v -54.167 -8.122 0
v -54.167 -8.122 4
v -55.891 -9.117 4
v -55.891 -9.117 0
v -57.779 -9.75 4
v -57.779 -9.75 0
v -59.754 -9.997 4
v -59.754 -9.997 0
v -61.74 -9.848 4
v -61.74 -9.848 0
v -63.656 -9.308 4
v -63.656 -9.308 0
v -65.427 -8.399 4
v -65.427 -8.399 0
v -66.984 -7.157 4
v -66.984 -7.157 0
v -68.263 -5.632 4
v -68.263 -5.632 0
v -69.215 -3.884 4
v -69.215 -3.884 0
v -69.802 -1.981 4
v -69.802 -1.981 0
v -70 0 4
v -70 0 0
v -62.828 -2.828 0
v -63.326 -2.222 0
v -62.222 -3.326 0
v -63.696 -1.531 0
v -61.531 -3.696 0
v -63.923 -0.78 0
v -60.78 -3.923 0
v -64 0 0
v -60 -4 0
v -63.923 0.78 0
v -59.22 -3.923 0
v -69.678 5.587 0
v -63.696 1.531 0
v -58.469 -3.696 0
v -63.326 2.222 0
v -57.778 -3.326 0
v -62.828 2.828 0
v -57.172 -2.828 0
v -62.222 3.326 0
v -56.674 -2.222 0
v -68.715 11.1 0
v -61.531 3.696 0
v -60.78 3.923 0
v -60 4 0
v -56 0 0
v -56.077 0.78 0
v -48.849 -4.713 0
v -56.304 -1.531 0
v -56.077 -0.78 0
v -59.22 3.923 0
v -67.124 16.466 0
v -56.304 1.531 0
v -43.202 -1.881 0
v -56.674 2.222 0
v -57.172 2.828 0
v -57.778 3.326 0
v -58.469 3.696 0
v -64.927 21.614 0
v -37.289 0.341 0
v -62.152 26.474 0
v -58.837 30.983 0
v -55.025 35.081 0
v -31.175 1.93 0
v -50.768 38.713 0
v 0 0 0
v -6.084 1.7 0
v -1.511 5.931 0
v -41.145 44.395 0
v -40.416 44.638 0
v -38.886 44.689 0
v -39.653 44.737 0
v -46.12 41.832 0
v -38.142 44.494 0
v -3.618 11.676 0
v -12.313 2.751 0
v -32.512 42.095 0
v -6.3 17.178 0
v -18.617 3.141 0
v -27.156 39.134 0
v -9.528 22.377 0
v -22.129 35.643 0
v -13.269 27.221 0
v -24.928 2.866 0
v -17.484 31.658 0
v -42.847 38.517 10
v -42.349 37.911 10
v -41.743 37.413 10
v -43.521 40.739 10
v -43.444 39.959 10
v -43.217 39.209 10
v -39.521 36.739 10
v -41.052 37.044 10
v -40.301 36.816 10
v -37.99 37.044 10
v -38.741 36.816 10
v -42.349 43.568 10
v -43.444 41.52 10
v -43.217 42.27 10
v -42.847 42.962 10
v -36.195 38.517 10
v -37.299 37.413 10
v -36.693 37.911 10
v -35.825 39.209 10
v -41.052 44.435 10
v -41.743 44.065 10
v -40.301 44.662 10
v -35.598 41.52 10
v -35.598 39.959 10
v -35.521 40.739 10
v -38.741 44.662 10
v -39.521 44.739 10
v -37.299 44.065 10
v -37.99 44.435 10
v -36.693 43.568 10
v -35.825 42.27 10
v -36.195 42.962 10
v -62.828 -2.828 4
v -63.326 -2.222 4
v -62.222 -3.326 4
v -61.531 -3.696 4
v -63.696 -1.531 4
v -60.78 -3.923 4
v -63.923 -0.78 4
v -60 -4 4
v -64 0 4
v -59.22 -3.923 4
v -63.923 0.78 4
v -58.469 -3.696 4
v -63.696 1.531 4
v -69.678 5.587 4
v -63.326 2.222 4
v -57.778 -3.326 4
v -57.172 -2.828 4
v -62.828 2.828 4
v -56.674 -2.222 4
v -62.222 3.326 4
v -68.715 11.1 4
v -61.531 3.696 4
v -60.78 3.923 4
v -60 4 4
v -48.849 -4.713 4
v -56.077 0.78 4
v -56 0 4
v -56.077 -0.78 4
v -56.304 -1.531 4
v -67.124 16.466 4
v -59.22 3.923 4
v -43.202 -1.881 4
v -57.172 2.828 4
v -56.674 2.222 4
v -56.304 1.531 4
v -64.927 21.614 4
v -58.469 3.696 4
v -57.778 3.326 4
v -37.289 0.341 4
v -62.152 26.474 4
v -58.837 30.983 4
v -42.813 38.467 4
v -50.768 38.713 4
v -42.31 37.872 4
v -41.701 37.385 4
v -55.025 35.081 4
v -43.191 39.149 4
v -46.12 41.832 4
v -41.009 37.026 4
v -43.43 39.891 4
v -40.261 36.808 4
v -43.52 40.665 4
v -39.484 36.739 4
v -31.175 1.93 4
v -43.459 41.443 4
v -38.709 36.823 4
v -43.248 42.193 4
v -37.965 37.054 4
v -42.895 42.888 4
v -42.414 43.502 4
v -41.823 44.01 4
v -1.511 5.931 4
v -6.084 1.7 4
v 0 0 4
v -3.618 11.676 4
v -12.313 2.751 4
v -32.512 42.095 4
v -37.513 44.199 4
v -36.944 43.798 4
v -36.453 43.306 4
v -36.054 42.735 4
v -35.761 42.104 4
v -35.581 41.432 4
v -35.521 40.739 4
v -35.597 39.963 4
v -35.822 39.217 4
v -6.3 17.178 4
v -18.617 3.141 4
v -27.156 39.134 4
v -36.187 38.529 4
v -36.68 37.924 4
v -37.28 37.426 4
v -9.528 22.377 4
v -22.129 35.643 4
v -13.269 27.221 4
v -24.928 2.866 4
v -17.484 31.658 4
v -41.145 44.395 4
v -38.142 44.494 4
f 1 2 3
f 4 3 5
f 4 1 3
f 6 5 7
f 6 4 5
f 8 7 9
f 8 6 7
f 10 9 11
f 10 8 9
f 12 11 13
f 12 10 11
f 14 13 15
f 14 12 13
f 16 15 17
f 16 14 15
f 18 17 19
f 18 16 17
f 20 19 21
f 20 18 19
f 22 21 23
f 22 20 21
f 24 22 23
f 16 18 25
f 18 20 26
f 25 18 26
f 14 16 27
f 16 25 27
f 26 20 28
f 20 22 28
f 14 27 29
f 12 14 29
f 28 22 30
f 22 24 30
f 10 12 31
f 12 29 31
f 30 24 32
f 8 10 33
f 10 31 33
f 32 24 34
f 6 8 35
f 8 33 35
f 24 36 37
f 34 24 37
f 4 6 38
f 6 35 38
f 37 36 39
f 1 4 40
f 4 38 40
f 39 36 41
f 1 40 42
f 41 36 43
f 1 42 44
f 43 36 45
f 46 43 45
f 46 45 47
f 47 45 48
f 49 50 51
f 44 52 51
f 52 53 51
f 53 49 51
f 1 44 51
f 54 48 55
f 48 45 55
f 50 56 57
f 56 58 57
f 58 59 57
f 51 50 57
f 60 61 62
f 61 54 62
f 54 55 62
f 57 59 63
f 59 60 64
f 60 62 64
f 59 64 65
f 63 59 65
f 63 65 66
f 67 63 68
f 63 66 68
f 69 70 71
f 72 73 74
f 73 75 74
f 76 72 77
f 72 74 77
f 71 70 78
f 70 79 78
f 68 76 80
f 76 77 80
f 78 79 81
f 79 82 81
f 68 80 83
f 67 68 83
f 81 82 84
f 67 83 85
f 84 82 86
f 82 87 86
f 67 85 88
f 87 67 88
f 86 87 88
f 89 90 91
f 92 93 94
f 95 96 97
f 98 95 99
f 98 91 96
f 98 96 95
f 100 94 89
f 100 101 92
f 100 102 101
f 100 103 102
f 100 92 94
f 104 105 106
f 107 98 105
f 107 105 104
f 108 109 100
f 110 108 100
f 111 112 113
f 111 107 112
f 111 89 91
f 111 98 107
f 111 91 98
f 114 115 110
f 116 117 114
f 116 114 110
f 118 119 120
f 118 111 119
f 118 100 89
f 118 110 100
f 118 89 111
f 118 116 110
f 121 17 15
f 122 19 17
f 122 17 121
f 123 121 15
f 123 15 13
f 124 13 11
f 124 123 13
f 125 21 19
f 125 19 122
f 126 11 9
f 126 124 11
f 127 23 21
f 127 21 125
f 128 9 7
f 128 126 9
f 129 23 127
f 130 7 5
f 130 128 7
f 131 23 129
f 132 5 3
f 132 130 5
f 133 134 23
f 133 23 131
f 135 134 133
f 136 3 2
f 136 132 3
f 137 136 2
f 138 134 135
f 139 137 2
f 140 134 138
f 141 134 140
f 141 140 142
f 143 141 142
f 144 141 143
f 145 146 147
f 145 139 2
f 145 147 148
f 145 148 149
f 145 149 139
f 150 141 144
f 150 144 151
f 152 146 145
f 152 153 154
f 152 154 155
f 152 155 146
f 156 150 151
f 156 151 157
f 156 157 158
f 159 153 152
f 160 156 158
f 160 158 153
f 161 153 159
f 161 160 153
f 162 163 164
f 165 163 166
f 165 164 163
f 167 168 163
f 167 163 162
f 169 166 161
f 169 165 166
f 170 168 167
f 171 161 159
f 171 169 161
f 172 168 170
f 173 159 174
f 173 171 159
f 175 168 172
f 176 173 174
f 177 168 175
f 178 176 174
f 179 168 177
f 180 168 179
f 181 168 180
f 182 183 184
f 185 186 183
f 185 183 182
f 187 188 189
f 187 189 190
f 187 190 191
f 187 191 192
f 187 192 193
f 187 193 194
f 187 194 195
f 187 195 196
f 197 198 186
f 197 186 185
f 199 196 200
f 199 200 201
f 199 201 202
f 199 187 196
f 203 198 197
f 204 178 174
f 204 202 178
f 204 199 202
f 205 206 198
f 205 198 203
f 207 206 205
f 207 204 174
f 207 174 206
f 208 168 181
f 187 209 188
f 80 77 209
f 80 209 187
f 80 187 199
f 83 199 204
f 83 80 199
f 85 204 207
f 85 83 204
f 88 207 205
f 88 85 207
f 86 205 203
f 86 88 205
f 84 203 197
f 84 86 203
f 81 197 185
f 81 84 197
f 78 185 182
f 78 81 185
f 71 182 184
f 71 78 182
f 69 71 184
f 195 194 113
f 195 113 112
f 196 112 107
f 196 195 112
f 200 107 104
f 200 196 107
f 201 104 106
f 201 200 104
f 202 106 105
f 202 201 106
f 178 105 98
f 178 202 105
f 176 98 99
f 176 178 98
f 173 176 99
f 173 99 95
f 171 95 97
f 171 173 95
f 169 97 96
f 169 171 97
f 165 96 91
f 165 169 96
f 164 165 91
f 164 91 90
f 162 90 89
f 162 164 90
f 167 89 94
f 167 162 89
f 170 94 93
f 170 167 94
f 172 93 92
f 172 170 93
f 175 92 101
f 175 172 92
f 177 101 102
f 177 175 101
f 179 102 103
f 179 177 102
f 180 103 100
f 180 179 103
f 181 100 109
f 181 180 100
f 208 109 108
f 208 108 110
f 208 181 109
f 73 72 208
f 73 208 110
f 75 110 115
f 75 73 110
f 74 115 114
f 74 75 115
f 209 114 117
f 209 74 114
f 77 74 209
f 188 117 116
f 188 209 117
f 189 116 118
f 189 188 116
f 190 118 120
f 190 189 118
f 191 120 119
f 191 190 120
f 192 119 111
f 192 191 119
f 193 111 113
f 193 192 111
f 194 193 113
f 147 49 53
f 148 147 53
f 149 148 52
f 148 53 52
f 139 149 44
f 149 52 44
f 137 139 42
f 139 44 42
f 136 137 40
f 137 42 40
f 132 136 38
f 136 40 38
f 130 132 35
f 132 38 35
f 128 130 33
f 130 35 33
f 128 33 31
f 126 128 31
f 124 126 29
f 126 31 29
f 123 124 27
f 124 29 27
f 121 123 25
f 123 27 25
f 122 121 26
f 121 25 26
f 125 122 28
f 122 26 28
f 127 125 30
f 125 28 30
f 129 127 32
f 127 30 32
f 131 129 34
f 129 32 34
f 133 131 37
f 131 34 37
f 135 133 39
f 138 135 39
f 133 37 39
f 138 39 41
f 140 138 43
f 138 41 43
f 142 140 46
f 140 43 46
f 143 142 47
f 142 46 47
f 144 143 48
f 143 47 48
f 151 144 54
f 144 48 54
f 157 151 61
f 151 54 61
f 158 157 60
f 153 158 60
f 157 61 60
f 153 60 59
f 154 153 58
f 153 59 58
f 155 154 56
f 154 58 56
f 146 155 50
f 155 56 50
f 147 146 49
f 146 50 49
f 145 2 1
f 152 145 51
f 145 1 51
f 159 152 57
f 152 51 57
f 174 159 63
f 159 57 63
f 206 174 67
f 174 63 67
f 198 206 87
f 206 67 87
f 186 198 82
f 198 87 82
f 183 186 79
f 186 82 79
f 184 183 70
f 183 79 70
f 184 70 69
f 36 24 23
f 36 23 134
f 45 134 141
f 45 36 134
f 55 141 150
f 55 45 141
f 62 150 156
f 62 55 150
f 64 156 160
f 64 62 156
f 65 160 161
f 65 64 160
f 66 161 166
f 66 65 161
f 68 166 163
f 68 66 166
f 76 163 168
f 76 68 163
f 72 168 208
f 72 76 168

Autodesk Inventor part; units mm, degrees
ref_plane "YZ Plane" through (0, 0, 0) normal (1, 0, 0) x (0, 1, 0)
ref_plane "XZ Plane" through (0, 0, 0) normal (0, 1, 0) x (-1, 0, 0)
ref_plane "XY Plane" through (0, 0, 0) normal (0, 0, 1) x (1, 0, 0)
sketch "Sketch1" plane through (0, 0, 0) normal (0, 0, 1) x (1, 0, 0)
  circle A0 centre (0, 0) radius 50
  circle A1 centre (0, 0) radius 60
  circle A2 centre (0, 0) radius 70
  circle A3 centre (-60, 0) radius 10
  circle A4 centre (-60, 0) radius 4
  line L0 (0, 0) -> (-60, 0) construction
  line L1 (0, 0) -> (-30, -51.9615) construction
  circle A5 centre (-30, -51.9615) radius 10
  circle A6 centre (-30, -51.9615) radius 4
  line L2 (0, 0) -> (30, -51.9615) construction
  circle A7 centre (30, -51.9615) radius 10
  circle A8 centre (30, -51.9615) radius 4
  line L3 (0, 0) -> (60, 0) construction
  circle A9 centre (60, 0) radius 10
  circle A10 centre (60, 0) radius 4
  line L4 (0, 0) -> (30, 51.9615) construction
  circle A11 centre (30, 51.9615) radius 10
  circle A12 centre (30, 51.9615) radius 4
  line L5 (0, 0) -> (-30, 51.9615) construction
  circle A13 centre (-30, 51.9615) radius 10
  circle A14 centre (-30, 51.9615) radius 4
  arc A15 (0, 0) -> (-39.6557, 45.027) centre (-58.8223, -11.8293) ccw
  arc A16 (0, 0) -> (-58.8223, -11.8293) centre (-19.1667, -56.8563) ccw
  arc A17 (-39.6557, 45.027) -> (-70, 0) centre (-21.4208, 0) ccw
  line L6 (0, 0) -> (60, 0) construction
  circle A18 centre (-39.521, 40.7393) radius 4
  arc A19 (-39.521, 40.7393) -> (-85.0417, 38.105) centre (-60, 0) ccw construction
  line L7 (-60, 0) -> (-85.0417, 38.105) construction
  line L8 (-60, 0) -> (-39.521, 40.7393) construction
  line L9 (-85.0417, 38.105) -> (0, 0) construction
  point P0 (-54.1667, -8.1223)
  point P1 (-38.1423, 44.4942)
  point P2 (-40.0141, 44.7088)
  point P3 (-41.1451, 44.3947)
  dimension "d42" = 140
  dimension "d43" = 20
  dimension "d40" = 100
  dimension "d41" = 120
  dimension "d44" = 8
  dimension "d47" = 360
  dimension "d49" = 60
  dimension "d50" = 60
  dimension "d58" = 8
  dimension "d59" = 60
  dimension "d60" = 93.1885
extrude "Extrusion3" add sketch "Sketch1" along normal blind 4 contours A15 A16 A0 | A0 A3 A1 A18 A15 | A16 A3 A0 | A3 A1 A4 | A18 A1 | A3 A17 A18 A1 | A1 A4 A3 | A1 A18 picked at (-28.7442, 18.7739)
extrude "Extrusion4" add sketch "Sketch1" along normal blind 10 contours A18 A1 | A1 A18
properties part number "Shutter"
